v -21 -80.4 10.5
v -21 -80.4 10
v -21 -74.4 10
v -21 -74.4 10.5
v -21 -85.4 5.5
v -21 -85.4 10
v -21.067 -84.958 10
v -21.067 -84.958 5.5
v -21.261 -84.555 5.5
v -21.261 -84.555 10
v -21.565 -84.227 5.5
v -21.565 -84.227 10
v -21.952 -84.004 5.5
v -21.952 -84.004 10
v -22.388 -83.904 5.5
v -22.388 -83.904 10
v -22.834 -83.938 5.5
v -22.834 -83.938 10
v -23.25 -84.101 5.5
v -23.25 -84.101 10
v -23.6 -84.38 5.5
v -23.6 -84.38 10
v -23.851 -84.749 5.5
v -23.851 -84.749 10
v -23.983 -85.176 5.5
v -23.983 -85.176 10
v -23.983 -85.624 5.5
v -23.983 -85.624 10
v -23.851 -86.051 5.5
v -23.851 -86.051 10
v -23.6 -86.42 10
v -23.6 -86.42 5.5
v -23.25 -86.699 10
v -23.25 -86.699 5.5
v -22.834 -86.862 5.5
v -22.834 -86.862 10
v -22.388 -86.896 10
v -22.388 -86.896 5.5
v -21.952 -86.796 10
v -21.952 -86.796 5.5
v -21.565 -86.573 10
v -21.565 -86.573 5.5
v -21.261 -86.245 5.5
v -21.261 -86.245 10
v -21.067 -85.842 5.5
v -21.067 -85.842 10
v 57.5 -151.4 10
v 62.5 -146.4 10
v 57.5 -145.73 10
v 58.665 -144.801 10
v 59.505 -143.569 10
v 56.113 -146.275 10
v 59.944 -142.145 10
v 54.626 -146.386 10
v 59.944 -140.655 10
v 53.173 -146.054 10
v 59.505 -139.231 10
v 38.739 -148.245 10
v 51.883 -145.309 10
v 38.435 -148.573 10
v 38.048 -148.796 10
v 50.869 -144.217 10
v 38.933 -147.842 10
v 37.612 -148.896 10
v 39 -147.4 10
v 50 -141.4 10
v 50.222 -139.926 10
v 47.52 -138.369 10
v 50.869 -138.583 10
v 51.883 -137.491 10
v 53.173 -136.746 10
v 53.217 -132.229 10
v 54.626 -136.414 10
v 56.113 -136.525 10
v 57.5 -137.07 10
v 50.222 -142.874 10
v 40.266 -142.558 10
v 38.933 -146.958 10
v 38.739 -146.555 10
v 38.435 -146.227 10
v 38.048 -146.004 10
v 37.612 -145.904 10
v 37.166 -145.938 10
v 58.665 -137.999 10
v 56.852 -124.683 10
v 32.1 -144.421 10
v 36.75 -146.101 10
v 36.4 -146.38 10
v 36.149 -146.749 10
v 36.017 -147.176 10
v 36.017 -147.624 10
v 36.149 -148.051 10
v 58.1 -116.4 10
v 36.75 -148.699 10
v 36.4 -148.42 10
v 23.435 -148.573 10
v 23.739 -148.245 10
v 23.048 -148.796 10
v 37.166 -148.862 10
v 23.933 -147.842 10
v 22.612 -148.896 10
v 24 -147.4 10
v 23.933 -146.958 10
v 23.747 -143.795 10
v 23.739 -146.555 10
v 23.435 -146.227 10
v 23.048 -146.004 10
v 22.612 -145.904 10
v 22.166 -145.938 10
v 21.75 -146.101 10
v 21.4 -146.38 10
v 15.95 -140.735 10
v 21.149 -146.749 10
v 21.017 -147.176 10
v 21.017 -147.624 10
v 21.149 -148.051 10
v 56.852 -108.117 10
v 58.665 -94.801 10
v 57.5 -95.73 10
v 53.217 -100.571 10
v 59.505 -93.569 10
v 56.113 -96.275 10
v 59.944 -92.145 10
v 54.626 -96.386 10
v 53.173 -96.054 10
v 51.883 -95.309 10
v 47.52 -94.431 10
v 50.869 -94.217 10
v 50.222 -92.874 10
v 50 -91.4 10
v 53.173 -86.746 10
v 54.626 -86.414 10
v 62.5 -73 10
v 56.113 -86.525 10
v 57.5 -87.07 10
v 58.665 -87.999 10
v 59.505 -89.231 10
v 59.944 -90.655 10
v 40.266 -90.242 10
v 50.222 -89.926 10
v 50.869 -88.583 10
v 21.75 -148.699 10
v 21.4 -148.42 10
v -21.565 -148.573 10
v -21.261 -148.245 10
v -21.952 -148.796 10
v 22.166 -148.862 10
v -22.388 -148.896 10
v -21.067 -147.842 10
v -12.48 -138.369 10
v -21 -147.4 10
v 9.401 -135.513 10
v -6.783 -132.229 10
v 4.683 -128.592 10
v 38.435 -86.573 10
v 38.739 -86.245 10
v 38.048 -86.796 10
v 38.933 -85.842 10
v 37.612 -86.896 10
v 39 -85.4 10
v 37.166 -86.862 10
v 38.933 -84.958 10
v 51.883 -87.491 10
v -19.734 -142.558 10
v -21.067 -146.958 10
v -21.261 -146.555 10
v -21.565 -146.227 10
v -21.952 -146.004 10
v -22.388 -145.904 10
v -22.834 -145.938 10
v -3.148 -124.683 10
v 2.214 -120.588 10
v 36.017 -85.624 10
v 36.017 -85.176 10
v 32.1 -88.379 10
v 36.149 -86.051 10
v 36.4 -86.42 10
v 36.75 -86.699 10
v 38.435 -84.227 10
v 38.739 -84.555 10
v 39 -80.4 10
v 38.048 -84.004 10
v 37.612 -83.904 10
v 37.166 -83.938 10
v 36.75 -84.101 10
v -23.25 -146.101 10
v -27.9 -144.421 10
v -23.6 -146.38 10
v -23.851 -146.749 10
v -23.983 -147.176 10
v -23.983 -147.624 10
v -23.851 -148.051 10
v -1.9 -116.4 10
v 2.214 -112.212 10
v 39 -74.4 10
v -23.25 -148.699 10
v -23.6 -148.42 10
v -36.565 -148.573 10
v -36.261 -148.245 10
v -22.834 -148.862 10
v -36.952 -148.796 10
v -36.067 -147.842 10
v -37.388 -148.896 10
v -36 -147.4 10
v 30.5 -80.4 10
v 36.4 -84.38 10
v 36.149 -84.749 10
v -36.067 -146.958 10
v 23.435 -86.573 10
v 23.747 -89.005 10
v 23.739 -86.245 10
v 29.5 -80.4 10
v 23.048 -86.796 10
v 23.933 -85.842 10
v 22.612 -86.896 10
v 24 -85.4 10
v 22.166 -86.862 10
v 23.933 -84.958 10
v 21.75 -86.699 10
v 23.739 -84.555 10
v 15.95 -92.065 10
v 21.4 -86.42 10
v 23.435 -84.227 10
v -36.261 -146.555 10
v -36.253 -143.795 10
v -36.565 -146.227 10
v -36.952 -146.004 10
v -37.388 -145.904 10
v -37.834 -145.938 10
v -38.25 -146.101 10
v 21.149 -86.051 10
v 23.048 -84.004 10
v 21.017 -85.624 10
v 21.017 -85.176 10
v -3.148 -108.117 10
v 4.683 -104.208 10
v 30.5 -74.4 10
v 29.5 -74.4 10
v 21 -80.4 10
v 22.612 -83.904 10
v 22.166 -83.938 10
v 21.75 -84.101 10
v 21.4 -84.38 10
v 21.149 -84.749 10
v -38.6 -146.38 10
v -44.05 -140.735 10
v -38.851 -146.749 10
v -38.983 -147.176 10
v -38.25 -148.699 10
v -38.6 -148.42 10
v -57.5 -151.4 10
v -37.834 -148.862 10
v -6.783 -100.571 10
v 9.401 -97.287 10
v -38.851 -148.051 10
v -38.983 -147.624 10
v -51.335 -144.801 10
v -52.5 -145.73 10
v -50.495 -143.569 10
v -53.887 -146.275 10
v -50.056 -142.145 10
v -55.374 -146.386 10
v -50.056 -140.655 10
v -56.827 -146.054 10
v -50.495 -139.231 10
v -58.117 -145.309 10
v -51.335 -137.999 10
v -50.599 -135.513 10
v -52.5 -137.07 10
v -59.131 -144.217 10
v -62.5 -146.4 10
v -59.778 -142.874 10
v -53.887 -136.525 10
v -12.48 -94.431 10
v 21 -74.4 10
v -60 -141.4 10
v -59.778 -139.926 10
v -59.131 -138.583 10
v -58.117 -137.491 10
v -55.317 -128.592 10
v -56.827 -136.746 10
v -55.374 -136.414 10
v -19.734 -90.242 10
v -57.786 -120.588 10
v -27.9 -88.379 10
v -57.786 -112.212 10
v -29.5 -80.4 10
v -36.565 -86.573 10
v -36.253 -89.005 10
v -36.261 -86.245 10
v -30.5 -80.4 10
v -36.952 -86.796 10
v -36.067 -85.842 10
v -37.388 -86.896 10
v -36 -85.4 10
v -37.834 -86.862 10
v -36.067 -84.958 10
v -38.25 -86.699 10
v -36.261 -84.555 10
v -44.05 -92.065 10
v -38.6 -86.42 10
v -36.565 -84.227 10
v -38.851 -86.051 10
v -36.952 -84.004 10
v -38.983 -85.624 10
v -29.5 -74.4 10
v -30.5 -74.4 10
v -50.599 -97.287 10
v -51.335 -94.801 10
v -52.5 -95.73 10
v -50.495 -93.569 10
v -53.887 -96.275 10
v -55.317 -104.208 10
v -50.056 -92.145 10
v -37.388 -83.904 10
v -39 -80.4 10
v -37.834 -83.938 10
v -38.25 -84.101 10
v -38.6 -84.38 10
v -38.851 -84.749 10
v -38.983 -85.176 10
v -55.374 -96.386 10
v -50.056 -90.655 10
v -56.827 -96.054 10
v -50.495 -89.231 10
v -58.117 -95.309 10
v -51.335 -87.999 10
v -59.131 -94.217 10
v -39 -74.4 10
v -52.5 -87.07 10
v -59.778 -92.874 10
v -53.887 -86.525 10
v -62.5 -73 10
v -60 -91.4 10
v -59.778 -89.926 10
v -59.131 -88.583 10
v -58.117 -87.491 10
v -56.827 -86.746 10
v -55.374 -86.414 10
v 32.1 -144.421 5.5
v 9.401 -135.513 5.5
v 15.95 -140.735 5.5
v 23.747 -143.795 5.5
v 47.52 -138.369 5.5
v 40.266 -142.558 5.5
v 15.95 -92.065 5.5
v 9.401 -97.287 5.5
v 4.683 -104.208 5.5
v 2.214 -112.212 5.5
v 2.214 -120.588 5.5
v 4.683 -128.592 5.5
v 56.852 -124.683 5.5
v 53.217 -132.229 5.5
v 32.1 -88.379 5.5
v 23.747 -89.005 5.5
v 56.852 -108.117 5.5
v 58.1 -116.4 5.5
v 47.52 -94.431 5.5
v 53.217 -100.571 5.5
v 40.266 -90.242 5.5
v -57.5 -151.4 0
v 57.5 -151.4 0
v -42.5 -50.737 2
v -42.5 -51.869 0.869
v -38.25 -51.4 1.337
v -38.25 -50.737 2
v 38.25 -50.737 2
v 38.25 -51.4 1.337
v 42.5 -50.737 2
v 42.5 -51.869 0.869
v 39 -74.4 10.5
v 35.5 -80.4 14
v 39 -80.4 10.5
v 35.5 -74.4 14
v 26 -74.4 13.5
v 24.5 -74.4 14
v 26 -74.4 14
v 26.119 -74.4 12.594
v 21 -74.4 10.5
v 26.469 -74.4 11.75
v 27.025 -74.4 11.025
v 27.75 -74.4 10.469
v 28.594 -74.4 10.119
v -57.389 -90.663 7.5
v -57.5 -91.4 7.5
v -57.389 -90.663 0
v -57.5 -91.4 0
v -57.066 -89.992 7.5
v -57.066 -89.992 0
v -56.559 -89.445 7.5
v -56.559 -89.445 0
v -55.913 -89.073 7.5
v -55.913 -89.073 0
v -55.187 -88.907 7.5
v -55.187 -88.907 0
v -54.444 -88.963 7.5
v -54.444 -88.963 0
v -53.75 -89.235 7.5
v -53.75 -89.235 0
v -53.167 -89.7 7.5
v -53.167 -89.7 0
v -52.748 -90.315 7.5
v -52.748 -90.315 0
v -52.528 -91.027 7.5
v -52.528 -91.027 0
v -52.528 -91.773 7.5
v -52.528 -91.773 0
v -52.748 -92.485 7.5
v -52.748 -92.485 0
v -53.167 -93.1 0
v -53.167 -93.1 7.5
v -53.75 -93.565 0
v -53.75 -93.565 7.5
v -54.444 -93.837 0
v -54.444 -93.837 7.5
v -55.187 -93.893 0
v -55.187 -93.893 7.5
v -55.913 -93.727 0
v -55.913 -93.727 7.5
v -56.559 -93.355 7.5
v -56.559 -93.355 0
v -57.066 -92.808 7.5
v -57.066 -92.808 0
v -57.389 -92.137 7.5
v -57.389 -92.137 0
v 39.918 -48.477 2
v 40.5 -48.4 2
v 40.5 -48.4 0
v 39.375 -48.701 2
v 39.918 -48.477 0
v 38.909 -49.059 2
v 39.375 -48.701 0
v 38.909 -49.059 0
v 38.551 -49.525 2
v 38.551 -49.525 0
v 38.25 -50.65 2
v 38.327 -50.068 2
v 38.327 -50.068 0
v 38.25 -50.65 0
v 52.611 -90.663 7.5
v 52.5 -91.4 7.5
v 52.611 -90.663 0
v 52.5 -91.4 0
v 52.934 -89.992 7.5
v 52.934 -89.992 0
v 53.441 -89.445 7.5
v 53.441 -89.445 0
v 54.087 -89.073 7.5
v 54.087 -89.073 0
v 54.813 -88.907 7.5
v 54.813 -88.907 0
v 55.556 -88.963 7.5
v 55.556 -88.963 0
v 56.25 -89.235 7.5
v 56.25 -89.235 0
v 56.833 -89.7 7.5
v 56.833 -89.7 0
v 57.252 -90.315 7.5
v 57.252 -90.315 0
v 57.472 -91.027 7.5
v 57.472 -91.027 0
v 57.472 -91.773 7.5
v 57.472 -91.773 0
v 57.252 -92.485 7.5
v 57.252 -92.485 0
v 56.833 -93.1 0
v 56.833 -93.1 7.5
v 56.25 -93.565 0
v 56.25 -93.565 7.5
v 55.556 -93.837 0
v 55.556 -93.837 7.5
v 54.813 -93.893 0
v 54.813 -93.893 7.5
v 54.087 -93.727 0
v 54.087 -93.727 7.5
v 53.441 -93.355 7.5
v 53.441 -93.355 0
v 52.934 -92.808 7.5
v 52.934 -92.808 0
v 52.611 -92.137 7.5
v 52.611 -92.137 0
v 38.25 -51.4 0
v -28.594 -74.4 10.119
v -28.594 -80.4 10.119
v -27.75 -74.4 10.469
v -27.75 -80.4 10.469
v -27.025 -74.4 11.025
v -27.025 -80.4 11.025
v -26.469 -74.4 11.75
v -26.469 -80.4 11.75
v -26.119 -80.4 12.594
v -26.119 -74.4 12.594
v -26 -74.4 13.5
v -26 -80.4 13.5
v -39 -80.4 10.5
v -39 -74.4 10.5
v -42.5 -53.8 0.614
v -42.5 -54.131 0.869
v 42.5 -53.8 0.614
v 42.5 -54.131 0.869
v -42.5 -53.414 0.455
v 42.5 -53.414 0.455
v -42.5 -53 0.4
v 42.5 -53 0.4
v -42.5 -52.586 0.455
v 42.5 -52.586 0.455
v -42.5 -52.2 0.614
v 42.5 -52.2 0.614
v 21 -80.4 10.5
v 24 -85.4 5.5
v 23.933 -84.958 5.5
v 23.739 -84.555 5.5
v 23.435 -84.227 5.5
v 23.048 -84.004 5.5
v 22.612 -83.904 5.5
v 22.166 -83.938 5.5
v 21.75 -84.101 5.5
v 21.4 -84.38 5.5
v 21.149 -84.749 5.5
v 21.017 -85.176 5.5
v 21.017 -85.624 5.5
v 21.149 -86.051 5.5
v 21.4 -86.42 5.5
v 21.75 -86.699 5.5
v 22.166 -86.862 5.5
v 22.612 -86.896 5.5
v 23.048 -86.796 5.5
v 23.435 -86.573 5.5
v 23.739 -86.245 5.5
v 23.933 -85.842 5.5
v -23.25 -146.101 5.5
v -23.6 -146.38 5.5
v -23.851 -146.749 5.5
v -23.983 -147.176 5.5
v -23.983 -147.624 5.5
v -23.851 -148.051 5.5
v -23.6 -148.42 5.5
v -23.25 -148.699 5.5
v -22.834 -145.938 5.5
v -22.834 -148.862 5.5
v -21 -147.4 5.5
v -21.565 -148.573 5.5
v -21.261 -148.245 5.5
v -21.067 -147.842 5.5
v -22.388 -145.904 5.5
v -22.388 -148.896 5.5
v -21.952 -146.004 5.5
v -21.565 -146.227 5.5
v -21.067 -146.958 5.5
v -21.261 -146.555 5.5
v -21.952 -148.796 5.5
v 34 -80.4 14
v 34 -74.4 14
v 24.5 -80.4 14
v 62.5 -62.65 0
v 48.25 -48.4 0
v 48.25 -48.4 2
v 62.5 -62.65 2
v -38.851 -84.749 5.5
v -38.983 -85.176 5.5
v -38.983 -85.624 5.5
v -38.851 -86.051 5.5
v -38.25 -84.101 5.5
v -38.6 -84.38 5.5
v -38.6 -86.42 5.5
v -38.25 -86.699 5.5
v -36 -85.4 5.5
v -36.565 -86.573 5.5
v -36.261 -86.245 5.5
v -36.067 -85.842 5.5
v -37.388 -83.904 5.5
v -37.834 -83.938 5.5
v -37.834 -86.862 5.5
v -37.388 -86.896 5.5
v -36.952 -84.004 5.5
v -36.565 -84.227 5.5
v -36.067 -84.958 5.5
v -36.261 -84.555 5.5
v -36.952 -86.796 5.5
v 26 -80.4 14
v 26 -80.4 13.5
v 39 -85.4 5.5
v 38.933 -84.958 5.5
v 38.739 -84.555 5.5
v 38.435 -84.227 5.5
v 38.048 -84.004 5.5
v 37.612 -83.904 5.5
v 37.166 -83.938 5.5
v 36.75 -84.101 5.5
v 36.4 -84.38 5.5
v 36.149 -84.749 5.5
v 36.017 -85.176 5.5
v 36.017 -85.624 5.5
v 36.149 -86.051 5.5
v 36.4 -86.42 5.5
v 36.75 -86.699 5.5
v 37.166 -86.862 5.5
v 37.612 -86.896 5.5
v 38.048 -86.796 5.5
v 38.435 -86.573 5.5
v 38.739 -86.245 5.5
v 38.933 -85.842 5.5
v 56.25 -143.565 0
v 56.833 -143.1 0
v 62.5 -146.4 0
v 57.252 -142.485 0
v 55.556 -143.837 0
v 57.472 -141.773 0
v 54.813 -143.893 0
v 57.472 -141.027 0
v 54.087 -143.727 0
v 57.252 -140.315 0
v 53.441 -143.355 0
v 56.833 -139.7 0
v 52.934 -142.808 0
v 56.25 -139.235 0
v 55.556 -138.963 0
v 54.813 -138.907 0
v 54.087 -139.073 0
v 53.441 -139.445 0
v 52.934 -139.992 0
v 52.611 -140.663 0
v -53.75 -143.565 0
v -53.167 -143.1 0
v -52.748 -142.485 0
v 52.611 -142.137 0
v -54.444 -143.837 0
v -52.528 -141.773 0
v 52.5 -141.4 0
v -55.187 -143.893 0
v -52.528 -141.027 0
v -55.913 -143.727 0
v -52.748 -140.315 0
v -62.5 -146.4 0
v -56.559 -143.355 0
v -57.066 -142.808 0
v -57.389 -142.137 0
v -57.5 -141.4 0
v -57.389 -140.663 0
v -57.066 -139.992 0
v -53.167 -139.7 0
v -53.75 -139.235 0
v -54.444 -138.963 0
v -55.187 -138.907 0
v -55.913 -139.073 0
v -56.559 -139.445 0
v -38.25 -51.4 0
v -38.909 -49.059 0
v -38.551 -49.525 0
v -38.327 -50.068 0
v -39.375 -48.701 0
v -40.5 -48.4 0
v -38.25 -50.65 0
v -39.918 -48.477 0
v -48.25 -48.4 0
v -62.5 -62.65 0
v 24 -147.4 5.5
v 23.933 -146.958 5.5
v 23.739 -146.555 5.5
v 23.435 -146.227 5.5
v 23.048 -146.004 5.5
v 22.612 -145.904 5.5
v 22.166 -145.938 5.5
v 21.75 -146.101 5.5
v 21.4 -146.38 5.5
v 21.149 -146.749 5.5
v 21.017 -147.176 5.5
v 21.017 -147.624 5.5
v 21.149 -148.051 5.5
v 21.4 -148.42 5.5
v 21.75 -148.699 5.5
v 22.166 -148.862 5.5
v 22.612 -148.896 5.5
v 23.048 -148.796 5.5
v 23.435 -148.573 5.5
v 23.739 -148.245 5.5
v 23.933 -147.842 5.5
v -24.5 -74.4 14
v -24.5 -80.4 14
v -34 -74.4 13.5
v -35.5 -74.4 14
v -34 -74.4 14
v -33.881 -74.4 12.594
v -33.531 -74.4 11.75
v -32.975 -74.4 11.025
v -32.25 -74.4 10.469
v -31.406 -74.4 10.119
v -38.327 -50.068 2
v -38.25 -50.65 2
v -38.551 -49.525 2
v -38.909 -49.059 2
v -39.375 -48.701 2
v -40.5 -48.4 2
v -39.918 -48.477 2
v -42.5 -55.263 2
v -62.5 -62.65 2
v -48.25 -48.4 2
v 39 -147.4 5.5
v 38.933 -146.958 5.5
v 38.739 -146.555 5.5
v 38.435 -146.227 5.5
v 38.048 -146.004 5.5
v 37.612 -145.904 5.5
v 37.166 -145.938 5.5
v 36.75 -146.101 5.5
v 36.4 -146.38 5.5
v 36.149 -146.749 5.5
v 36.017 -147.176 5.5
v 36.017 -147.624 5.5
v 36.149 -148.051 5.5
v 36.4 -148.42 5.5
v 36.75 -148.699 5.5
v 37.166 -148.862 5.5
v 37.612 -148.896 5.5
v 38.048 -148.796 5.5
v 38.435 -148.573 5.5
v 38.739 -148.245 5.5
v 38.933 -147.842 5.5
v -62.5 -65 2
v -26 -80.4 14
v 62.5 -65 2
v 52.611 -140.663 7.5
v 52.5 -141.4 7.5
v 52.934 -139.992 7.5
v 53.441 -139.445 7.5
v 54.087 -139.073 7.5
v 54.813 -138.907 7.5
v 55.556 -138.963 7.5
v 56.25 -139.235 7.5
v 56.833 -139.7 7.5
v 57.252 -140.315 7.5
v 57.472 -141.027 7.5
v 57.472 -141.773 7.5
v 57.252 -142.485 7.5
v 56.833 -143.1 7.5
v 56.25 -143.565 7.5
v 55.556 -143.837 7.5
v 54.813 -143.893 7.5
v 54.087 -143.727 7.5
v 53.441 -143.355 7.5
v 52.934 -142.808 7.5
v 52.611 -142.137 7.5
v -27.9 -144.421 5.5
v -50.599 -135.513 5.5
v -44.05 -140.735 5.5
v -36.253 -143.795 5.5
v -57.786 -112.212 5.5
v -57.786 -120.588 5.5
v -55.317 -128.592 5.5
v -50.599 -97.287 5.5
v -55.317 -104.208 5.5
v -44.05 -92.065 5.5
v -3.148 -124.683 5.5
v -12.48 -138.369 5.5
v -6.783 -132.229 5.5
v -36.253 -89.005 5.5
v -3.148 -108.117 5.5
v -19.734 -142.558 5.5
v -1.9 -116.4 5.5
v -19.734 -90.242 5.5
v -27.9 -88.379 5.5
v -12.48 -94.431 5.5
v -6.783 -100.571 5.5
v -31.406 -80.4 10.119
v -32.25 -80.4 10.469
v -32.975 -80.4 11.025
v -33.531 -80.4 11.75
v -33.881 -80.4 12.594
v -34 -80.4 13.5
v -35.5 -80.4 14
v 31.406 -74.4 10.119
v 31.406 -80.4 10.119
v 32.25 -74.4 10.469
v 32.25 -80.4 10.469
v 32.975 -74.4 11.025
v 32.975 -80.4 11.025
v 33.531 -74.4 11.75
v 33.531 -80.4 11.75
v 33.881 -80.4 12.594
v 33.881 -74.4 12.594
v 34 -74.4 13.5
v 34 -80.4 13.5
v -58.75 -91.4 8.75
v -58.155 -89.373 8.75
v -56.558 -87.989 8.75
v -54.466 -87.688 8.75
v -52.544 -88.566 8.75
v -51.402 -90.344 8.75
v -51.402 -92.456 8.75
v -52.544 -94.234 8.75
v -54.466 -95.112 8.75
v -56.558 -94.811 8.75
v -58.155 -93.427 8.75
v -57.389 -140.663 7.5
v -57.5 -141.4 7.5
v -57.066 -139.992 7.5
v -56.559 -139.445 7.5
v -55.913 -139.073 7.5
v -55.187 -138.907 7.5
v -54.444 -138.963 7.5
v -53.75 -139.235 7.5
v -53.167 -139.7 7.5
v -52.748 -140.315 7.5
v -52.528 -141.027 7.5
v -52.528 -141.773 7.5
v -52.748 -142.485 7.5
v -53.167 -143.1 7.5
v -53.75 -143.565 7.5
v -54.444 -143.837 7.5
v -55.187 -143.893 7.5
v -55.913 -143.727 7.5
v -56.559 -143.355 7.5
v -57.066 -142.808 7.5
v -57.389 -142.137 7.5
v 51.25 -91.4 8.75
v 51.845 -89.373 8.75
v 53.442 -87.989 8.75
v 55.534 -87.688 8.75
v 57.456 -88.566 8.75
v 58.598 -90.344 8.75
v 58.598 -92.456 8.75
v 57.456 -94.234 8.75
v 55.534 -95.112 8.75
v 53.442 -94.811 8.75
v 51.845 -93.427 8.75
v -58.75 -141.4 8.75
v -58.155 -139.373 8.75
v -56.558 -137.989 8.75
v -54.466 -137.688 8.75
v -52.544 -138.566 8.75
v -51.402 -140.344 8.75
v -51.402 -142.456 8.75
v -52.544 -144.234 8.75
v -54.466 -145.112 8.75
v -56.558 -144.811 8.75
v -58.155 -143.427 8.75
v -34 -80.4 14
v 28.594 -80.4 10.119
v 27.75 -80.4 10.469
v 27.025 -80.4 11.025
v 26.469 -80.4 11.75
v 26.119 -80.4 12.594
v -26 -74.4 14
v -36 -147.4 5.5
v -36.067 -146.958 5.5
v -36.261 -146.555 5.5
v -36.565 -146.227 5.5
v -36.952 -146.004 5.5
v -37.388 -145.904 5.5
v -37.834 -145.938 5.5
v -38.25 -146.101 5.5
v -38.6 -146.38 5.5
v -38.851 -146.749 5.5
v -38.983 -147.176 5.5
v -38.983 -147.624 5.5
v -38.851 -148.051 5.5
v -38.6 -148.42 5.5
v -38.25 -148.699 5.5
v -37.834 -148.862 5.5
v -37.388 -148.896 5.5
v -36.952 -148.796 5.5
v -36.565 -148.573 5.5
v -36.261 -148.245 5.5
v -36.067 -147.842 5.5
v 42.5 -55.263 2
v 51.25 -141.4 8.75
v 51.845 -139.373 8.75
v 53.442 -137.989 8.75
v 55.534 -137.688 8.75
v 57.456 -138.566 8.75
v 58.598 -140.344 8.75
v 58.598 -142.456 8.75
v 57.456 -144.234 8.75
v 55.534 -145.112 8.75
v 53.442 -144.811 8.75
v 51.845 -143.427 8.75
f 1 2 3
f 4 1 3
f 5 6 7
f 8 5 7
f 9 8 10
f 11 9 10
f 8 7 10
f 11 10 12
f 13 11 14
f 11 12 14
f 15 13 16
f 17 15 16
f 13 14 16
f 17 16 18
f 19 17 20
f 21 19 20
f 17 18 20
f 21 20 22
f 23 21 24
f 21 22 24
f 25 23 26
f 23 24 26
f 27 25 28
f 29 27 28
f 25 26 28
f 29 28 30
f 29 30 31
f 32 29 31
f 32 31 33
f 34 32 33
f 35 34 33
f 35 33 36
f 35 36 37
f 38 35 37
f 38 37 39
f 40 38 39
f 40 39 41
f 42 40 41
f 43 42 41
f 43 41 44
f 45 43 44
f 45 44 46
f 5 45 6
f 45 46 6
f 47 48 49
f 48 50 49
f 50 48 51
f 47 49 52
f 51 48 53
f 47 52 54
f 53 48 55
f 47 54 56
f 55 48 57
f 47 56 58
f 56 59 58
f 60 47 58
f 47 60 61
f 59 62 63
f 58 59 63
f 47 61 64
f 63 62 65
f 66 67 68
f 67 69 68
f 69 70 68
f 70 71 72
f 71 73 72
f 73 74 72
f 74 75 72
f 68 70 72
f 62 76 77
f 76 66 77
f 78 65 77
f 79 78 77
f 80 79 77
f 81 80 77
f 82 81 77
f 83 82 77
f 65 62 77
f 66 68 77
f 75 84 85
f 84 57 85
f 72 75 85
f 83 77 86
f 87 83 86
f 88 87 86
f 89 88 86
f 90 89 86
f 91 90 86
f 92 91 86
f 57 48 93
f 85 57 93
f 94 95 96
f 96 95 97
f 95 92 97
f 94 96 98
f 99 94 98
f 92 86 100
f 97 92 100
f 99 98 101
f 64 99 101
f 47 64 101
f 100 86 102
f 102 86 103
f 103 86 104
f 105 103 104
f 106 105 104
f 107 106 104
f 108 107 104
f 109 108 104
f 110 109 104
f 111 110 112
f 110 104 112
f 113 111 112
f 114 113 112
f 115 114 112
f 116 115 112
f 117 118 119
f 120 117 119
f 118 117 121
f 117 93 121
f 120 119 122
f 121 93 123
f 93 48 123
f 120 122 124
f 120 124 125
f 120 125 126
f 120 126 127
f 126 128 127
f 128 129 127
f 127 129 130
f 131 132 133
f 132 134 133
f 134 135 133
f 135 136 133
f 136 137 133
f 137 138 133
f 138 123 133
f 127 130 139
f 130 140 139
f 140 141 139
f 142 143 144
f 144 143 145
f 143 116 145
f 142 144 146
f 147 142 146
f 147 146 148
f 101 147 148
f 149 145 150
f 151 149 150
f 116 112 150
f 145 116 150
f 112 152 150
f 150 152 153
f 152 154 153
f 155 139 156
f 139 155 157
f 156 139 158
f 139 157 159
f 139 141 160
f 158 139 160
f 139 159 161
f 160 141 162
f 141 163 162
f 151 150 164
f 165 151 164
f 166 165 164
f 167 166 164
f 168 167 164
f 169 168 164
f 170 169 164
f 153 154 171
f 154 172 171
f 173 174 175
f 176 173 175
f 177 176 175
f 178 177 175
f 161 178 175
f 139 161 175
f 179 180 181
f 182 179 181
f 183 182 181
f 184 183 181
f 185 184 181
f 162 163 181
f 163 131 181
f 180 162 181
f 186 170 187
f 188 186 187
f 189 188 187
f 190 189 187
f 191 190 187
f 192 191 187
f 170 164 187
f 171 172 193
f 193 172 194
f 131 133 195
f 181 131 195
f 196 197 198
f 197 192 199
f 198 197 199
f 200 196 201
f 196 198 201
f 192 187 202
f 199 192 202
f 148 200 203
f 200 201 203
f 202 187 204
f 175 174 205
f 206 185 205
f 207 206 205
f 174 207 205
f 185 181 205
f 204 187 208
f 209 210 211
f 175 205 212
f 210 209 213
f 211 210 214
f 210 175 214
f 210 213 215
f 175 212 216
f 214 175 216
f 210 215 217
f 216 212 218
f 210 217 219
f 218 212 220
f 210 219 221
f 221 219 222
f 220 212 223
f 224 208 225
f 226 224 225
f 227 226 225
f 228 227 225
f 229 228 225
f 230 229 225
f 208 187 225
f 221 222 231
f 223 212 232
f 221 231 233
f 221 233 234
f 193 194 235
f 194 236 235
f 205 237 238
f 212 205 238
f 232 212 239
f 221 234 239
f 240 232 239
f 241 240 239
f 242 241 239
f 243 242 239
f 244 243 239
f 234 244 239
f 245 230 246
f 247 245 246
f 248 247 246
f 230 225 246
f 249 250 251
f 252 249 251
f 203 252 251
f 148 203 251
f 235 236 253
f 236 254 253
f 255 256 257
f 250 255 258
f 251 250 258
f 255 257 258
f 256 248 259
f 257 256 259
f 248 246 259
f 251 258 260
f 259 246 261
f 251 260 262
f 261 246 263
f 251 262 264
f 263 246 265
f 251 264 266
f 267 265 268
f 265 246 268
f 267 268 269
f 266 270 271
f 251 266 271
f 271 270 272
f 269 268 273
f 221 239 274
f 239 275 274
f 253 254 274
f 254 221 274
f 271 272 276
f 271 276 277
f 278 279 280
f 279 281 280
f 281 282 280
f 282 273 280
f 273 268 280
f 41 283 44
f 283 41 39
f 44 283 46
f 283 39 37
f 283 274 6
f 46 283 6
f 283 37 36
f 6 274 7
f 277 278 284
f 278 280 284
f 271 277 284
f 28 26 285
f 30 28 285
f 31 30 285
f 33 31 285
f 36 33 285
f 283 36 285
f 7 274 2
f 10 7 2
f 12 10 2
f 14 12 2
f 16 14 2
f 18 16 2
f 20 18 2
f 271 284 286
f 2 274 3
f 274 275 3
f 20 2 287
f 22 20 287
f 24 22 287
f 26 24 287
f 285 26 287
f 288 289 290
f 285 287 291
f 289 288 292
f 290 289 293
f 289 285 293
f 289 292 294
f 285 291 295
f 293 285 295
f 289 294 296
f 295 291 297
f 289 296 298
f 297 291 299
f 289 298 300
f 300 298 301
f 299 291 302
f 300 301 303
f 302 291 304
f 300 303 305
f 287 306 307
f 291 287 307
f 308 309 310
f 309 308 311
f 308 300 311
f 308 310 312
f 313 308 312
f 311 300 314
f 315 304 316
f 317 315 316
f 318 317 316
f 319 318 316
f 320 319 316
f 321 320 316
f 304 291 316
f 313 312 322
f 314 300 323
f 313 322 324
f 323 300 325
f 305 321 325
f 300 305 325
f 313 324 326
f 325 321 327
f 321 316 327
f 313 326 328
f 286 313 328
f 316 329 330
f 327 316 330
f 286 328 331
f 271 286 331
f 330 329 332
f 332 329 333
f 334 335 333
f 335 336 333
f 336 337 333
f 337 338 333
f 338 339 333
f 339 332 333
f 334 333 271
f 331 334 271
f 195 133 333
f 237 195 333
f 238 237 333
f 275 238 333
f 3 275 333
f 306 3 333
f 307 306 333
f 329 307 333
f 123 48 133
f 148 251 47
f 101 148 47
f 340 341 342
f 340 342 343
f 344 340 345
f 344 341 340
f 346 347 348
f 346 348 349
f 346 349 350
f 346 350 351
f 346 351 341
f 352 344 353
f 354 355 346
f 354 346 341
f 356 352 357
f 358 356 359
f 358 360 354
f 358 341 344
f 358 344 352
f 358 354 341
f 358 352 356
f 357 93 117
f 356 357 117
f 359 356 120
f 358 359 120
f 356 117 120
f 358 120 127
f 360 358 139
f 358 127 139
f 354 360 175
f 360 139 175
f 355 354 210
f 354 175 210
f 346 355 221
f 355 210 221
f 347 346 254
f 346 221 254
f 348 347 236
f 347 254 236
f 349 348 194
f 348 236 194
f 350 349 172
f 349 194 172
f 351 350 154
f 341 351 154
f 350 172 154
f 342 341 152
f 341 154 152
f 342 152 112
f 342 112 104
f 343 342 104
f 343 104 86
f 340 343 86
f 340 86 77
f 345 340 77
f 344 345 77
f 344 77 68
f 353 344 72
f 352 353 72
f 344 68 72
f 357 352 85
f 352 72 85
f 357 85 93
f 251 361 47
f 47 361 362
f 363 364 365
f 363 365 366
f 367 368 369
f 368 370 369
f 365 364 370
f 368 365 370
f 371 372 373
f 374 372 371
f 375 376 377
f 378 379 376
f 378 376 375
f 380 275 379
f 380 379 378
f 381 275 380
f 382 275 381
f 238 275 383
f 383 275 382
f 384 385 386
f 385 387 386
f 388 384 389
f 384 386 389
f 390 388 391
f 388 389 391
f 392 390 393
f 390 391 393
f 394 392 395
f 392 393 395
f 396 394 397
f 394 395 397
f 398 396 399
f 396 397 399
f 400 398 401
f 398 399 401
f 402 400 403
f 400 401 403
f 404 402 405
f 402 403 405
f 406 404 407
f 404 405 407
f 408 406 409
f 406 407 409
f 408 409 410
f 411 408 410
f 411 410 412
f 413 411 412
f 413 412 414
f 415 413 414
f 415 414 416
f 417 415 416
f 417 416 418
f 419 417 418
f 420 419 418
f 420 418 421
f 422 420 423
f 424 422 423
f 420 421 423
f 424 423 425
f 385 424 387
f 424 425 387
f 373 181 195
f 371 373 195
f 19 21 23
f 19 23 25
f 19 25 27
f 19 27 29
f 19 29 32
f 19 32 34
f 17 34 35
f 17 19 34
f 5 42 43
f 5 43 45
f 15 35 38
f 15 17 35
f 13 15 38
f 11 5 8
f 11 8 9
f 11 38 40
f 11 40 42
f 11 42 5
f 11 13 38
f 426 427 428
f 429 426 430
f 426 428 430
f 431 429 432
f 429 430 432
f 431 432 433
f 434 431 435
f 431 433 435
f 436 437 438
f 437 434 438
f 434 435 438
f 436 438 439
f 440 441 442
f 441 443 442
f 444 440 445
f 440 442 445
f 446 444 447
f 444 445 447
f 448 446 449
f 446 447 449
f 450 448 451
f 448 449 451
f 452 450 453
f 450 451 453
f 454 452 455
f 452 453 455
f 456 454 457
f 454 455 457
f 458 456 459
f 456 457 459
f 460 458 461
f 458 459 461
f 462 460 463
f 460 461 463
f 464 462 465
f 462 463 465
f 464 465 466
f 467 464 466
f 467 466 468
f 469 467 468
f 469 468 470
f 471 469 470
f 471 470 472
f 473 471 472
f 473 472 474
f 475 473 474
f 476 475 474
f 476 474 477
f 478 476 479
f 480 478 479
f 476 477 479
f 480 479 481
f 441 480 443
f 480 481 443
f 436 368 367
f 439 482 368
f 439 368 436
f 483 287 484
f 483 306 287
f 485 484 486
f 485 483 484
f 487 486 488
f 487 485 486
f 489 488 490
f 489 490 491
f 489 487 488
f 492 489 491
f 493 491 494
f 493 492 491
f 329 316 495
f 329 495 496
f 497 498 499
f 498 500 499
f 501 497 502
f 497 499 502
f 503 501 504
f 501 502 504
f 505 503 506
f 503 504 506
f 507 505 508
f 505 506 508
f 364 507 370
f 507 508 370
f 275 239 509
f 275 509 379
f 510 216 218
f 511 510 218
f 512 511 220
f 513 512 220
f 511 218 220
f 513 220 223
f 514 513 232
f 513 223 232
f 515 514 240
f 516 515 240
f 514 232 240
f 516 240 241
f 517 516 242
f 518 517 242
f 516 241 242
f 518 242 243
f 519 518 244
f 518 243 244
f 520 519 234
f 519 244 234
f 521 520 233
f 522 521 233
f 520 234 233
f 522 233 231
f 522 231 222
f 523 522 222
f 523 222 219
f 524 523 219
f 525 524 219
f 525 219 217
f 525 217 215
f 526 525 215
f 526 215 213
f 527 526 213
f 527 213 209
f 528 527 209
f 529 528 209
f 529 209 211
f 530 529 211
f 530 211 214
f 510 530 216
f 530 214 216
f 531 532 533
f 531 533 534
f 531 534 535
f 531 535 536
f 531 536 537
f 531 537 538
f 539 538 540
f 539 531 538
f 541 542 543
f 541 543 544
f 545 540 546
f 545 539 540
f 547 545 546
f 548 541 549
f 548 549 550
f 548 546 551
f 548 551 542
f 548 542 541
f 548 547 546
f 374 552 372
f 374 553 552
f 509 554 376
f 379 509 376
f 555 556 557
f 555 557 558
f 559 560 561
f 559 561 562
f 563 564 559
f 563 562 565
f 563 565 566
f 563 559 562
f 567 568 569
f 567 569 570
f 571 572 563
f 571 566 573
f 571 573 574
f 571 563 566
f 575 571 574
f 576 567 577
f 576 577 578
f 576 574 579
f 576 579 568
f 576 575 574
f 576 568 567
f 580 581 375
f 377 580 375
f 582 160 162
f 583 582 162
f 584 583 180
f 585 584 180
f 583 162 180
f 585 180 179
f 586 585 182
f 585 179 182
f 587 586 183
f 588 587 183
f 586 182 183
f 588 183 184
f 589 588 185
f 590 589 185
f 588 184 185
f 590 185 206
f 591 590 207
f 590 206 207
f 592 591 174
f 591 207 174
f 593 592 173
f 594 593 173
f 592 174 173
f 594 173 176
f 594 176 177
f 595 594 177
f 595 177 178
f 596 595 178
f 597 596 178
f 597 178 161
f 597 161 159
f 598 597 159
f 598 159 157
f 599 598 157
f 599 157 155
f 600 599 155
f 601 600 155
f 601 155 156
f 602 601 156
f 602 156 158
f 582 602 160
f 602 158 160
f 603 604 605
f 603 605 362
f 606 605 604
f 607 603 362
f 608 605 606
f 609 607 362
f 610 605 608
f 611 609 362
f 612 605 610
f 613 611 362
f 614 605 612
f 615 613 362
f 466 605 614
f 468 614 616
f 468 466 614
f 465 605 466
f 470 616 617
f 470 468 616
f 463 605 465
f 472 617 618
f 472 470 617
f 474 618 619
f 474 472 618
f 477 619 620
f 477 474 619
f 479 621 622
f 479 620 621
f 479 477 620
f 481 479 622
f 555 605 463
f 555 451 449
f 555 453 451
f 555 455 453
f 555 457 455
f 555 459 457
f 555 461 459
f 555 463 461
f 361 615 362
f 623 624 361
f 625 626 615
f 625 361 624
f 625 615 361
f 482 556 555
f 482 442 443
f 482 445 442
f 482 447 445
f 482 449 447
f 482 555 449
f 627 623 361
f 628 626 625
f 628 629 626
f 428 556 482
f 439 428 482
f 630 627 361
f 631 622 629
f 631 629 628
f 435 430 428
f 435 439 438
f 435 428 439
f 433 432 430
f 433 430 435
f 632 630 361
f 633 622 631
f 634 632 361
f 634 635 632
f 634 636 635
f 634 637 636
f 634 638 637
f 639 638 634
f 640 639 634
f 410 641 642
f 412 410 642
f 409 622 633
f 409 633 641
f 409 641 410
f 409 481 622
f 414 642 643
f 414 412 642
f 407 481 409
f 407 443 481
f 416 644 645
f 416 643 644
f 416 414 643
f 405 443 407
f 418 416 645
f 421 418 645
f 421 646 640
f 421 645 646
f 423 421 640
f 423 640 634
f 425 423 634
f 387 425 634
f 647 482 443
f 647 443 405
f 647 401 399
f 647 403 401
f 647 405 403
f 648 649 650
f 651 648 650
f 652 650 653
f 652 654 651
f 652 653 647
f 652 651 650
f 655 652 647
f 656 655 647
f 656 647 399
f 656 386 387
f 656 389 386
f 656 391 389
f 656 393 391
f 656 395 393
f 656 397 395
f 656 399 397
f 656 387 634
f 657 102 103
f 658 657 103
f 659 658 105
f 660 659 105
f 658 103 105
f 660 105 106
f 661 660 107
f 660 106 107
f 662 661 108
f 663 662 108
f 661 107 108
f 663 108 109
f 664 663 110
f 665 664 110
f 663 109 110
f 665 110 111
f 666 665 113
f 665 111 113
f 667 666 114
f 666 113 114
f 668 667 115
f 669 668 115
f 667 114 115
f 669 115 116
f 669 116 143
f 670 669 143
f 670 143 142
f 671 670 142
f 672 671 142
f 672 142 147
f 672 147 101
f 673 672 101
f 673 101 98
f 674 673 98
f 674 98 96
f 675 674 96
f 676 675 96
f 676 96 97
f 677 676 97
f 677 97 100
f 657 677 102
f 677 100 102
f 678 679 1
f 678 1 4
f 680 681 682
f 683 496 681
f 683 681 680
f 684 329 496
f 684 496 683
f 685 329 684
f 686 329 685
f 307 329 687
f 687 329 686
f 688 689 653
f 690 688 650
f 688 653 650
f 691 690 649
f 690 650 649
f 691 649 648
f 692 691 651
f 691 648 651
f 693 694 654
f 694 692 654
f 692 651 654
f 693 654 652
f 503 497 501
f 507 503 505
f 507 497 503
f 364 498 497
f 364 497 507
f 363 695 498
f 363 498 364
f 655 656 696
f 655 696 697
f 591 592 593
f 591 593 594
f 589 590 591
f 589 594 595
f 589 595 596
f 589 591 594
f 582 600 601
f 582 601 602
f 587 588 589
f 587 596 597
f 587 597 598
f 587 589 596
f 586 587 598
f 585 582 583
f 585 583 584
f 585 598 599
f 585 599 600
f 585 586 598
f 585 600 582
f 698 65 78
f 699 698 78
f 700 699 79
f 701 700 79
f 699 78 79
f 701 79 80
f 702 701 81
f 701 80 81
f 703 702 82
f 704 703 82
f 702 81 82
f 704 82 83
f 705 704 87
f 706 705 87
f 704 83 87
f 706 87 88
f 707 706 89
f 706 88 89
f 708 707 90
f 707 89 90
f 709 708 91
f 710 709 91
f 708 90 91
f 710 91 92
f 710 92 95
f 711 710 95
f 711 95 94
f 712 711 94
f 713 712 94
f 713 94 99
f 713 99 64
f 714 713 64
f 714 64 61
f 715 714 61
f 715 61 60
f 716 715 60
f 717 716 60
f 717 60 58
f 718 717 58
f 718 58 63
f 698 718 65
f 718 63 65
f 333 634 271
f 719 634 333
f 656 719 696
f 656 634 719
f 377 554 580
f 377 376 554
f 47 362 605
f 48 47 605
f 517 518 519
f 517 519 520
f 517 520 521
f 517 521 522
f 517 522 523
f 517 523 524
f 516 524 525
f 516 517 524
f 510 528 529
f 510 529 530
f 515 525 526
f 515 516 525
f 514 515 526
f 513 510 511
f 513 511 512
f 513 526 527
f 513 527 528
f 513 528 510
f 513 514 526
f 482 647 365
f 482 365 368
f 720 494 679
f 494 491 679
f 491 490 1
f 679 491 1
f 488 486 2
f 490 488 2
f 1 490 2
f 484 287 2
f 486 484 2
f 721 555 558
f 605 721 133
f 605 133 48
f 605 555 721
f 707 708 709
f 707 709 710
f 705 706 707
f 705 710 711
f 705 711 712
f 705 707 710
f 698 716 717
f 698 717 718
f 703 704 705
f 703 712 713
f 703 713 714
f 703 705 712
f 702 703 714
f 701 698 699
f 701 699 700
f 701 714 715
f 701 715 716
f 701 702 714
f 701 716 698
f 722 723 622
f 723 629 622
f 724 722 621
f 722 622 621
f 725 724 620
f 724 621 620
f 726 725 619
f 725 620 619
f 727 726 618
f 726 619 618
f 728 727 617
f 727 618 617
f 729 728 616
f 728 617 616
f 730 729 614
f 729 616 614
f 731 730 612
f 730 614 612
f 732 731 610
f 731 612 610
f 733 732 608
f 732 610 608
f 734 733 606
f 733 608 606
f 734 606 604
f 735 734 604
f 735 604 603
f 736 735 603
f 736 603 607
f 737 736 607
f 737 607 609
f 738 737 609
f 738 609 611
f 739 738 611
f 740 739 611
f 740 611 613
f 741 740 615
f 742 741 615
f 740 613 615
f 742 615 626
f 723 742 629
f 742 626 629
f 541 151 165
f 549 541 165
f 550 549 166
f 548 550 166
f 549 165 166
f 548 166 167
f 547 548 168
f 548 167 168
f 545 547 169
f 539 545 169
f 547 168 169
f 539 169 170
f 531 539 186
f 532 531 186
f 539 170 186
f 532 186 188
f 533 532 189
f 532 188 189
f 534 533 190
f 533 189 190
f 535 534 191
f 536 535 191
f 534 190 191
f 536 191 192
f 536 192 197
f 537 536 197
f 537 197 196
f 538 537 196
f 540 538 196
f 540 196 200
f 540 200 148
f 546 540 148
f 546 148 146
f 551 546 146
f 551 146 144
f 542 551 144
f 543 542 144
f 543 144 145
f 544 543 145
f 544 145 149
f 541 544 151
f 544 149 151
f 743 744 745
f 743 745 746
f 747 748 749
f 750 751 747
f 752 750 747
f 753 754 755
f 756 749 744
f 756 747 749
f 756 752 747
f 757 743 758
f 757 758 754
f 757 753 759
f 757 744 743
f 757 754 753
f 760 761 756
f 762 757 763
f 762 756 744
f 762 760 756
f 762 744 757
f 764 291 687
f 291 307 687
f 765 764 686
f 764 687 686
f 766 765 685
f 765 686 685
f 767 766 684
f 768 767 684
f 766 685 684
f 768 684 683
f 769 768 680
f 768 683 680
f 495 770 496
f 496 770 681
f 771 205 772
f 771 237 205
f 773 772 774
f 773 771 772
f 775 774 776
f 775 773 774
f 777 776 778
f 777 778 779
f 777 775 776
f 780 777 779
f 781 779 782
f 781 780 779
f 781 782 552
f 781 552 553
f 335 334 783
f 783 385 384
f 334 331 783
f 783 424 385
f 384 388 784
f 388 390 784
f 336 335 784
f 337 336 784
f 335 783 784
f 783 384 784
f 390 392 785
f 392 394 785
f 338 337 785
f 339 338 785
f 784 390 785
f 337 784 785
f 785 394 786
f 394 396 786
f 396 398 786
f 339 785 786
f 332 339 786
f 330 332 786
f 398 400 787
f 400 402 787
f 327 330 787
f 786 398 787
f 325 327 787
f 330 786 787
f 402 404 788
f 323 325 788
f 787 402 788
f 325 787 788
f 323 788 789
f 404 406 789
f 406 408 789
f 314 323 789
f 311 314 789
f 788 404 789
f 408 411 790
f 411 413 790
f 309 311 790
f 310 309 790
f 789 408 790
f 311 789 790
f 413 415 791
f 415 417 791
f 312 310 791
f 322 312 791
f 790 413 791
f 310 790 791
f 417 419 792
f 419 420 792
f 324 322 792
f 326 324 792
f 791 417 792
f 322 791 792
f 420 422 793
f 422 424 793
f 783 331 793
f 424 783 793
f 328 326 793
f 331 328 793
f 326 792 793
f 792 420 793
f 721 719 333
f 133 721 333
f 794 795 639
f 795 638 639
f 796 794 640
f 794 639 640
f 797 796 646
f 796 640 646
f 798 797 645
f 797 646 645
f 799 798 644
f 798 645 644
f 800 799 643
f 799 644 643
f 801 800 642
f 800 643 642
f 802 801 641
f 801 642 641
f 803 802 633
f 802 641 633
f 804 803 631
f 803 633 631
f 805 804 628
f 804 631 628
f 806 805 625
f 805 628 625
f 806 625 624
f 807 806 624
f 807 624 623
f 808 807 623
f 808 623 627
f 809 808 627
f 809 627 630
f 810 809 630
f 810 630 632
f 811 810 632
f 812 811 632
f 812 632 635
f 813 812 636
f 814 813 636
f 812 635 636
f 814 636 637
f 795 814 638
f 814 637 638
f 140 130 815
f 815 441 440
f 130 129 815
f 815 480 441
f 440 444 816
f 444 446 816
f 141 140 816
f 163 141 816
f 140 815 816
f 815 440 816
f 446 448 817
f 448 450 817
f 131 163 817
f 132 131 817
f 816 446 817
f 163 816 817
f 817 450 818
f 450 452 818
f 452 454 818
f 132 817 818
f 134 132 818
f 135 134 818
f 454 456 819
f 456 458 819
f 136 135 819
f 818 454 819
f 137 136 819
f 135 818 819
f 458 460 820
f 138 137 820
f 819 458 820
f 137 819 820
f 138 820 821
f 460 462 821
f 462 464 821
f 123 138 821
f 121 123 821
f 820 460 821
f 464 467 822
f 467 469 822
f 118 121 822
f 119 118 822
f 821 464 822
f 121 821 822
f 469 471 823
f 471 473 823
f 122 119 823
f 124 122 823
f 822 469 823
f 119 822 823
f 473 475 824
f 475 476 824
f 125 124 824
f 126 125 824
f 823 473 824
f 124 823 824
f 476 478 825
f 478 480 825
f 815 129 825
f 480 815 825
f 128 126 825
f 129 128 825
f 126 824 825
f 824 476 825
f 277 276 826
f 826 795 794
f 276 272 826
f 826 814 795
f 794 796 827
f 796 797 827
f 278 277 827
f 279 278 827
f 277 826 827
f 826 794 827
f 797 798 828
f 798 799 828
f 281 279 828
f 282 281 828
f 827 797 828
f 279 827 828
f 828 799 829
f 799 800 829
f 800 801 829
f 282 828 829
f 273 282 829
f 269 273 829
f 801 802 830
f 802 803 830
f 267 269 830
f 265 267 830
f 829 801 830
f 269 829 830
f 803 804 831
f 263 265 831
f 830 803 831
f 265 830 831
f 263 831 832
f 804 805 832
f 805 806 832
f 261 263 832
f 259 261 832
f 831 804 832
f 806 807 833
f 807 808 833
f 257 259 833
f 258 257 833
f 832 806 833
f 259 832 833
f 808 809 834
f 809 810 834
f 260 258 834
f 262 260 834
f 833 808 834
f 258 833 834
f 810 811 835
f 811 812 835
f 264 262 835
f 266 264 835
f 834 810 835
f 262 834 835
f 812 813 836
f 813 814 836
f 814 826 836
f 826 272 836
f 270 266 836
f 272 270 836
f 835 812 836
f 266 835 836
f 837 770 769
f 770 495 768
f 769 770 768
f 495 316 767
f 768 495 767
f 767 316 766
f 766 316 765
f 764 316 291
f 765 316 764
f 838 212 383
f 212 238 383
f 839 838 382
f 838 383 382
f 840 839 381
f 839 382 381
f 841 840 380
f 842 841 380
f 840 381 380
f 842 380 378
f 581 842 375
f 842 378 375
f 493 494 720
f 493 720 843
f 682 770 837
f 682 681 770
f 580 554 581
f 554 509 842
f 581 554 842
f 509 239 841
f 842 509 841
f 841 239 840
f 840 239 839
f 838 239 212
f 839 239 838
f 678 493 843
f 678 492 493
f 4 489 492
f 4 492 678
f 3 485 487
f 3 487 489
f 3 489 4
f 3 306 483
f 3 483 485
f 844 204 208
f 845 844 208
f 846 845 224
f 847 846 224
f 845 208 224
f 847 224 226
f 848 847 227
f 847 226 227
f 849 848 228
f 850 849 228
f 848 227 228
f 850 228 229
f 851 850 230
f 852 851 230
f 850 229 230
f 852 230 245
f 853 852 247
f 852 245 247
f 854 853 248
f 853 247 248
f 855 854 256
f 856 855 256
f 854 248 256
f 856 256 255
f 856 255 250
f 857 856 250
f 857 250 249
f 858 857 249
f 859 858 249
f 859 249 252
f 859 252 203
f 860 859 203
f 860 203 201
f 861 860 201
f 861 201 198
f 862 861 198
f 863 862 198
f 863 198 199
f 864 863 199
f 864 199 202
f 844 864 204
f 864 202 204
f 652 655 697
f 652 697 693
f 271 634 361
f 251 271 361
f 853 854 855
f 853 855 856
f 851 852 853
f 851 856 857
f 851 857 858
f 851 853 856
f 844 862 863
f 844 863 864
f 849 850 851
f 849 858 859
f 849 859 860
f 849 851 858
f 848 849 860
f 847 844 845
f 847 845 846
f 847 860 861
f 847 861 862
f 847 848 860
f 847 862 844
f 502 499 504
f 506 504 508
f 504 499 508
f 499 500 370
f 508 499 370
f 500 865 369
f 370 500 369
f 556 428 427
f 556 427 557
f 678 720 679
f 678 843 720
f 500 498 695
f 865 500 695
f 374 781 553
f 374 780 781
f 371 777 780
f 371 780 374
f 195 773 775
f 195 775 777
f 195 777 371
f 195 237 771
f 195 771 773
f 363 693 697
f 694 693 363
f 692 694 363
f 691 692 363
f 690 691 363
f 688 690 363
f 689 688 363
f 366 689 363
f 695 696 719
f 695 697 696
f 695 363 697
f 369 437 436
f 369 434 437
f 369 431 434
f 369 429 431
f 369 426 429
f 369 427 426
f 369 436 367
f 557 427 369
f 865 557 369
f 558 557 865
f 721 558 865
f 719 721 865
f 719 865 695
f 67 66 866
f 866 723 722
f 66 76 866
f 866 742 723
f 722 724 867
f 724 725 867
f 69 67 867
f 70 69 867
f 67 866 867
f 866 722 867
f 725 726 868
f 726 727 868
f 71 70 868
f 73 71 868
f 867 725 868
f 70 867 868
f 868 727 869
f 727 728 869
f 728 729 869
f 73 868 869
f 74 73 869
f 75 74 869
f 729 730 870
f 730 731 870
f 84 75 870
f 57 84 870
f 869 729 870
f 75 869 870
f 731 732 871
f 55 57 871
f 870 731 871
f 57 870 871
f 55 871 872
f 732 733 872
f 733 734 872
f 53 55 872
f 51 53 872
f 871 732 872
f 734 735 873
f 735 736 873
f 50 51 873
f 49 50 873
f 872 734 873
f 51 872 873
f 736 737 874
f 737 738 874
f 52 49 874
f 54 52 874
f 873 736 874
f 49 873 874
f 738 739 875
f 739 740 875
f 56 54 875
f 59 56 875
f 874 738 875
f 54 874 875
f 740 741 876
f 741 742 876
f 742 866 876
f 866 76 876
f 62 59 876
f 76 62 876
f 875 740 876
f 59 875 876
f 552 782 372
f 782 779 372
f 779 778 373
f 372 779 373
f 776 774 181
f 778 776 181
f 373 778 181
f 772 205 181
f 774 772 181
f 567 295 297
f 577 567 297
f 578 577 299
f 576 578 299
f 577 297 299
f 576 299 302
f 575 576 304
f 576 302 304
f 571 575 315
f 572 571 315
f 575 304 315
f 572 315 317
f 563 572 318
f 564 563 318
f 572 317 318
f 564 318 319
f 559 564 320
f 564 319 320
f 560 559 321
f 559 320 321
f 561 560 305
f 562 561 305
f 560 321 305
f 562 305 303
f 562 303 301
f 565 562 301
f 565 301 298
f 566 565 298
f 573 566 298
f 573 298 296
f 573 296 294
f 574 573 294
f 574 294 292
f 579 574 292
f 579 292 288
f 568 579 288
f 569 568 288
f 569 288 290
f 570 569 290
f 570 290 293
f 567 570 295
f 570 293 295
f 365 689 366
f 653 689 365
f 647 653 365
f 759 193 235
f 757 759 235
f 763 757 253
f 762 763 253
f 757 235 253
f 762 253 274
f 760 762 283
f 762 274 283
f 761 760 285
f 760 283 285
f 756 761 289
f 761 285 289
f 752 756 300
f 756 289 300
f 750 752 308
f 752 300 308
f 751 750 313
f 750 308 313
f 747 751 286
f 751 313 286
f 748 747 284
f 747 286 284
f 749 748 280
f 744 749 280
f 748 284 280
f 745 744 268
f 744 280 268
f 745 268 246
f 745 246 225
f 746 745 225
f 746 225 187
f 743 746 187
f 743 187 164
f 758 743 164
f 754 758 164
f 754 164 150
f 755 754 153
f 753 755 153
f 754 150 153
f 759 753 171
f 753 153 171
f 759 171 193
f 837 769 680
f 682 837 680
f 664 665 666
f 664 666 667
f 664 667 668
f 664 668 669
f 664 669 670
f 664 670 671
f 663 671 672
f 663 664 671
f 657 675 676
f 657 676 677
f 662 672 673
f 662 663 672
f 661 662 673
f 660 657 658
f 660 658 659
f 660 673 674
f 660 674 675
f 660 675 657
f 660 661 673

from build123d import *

# Parameters (mm, degrees)
PAD_DEPTH            = 10
SKETCH001_R          = 28.1
SKETCH001_R_2        = 1.5
POCKET_DEPTH         = 4.5
POCKET001_DEPTH      = 62.501
POCKET001_DEPTH_BACK = -62.501
HOLE_D               = 5
HOLE_DEPTH           = 25
HOLE_CSINK_D         = 10
HOLE_CSINK_ANGLE     = 90
SKETCH005_W          = 5
SKETCH005_H          = 6
PAD001_DEPTH         = 4
POCKET002_DEPTH      = 42.5
CHAMFER_SIZE         = 3.5
FILLET_R             = 3.5


with BuildPart() as part:
    # Sketch → Pad (new body)
    with BuildSketch(Plane.XY):
        with BuildLine():
            Line((-48.25, -48.4), (-40.5, -48.4))
            ThreePointArc((-38.25, -50.65), (-38.90901, -49.05901), (-40.5, -48.4))
            Line((-38.25, -50.65), (-38.25, -51.4))
            Line((-38.25, -51.4), (38.25, -51.4))
            Line((38.25, -51.4), (38.25, -50.65))
            ThreePointArc((40.5, -48.4), (38.90901, -49.05901), (38.25, -50.65))
            Line((40.5, -48.4), (48.25, -48.4))
            Line((48.25, -48.4), (62.5, -62.65))
            Line((62.5, -62.65), (62.5, -146.4))
            Line((57.5, -151.4), (62.5, -146.4))
            Line((-57.5, -151.4), (57.5, -151.4))
            Line((-62.5, -146.4), (-57.5, -151.4))
            Line((-62.5, -146.4), (-62.5, -62.65))
            Line((-62.5, -62.65), (-48.25, -48.4))
        make_face()
    extrude(amount=PAD_DEPTH)

    # Sketch001 → Pocket (cut)
    with BuildSketch(Plane.XY.offset(10)):
        with Locations((-30, -116.4)):
            Circle(SKETCH001_R)
        with Locations((30, -116.4)):
            Circle(SKETCH001_R)
        with Locations((-37.5, -85.4)):
            Circle(SKETCH001_R_2)
        with Locations((-22.5, -85.4)):
            Circle(SKETCH001_R_2)
        with Locations((22.5, -85.4)):
            Circle(SKETCH001_R_2)
        with Locations((37.5, -85.4)):
            Circle(SKETCH001_R_2)
        with Locations((-37.5, -147.4)):
            Circle(SKETCH001_R_2)
        with Locations((-22.5, -147.4)):
            Circle(SKETCH001_R_2)
        with Locations((22.5, -147.4)):
            Circle(SKETCH001_R_2)
        with Locations((37.5, -147.4)):
            Circle(SKETCH001_R_2)
    extrude(amount=-POCKET_DEPTH, mode=Mode.SUBTRACT)

    # Sketch002 → Pocket001 (cut, two sides)
    with BuildSketch(Plane.YZ) as pocket001_sk:
        Polygon((0, 2), (-65, 2), (-85, 22), (0, 22), align=None)
    extrude(amount=-POCKET001_DEPTH, mode=Mode.SUBTRACT)
    extrude(pocket001_sk.sketch, amount=-POCKET001_DEPTH_BACK, mode=Mode.SUBTRACT)

    # Hole
    with Locations(Plane.XY.offset(10)):
        with Locations((-55, -91.4), (55, -91.4), (55, -141.4), (-55, -141.4)):
            CounterSinkHole(HOLE_D / 2, HOLE_CSINK_D / 2, depth=HOLE_DEPTH, counter_sink_angle=HOLE_CSINK_ANGLE)

    # Sketch005 (on Face6 of Hole) → Pad001 (join)
    with BuildSketch(Plane.XY.offset(10)):
        with Locations((-36.5, -77.4)):
            Rectangle(SKETCH005_W, SKETCH005_H)
        with Locations((-23.5, -77.4)):
            Rectangle(SKETCH005_W, SKETCH005_H)
        with Locations((23.5, -77.4)):
            Rectangle(SKETCH005_W, SKETCH005_H)
        with Locations((36.5, -77.4)):
            Rectangle(SKETCH005_W, SKETCH005_H)
    extrude(amount=PAD001_DEPTH)

    # Sketch006 → Pocket002 (cut, symmetric)
    with BuildSketch(Plane.YZ):
        with BuildLine():
            ThreePointArc((-54.131371, 0.868629), (-53, 0.4), (-51.868629, 0.868629))
            Line((-51.868629, 0.868629), (-37.737258, 15))
            Line((-68.262742, 15), (-37.737258, 15))
            Line((-54.131371, 0.868629), (-68.262742, 15))
        make_face()
    extrude(amount=POCKET002_DEPTH, both=True, mode=Mode.SUBTRACT)

    # Chamfer
    chamfer_edges = [part.edges().sort_by_distance(p)[0] for p in [
        (39, -77.4, 14),
        (21, -77.4, 14),
        (-21, -77.4, 14),
        (-39, -77.4, 14),
    ]]
    chamfer(chamfer_edges, length=CHAMFER_SIZE)

    # Fillet
    fillet_edges = [part.edges().sort_by_distance(p)[0] for p in [
        (-34, -77.4, 10),
        (26, -77.4, 10),
        (-26, -77.4, 10),
        (34, -77.4, 10),
    ]]
    fillet(fillet_edges, radius=FILLET_R)


solid = part.part
